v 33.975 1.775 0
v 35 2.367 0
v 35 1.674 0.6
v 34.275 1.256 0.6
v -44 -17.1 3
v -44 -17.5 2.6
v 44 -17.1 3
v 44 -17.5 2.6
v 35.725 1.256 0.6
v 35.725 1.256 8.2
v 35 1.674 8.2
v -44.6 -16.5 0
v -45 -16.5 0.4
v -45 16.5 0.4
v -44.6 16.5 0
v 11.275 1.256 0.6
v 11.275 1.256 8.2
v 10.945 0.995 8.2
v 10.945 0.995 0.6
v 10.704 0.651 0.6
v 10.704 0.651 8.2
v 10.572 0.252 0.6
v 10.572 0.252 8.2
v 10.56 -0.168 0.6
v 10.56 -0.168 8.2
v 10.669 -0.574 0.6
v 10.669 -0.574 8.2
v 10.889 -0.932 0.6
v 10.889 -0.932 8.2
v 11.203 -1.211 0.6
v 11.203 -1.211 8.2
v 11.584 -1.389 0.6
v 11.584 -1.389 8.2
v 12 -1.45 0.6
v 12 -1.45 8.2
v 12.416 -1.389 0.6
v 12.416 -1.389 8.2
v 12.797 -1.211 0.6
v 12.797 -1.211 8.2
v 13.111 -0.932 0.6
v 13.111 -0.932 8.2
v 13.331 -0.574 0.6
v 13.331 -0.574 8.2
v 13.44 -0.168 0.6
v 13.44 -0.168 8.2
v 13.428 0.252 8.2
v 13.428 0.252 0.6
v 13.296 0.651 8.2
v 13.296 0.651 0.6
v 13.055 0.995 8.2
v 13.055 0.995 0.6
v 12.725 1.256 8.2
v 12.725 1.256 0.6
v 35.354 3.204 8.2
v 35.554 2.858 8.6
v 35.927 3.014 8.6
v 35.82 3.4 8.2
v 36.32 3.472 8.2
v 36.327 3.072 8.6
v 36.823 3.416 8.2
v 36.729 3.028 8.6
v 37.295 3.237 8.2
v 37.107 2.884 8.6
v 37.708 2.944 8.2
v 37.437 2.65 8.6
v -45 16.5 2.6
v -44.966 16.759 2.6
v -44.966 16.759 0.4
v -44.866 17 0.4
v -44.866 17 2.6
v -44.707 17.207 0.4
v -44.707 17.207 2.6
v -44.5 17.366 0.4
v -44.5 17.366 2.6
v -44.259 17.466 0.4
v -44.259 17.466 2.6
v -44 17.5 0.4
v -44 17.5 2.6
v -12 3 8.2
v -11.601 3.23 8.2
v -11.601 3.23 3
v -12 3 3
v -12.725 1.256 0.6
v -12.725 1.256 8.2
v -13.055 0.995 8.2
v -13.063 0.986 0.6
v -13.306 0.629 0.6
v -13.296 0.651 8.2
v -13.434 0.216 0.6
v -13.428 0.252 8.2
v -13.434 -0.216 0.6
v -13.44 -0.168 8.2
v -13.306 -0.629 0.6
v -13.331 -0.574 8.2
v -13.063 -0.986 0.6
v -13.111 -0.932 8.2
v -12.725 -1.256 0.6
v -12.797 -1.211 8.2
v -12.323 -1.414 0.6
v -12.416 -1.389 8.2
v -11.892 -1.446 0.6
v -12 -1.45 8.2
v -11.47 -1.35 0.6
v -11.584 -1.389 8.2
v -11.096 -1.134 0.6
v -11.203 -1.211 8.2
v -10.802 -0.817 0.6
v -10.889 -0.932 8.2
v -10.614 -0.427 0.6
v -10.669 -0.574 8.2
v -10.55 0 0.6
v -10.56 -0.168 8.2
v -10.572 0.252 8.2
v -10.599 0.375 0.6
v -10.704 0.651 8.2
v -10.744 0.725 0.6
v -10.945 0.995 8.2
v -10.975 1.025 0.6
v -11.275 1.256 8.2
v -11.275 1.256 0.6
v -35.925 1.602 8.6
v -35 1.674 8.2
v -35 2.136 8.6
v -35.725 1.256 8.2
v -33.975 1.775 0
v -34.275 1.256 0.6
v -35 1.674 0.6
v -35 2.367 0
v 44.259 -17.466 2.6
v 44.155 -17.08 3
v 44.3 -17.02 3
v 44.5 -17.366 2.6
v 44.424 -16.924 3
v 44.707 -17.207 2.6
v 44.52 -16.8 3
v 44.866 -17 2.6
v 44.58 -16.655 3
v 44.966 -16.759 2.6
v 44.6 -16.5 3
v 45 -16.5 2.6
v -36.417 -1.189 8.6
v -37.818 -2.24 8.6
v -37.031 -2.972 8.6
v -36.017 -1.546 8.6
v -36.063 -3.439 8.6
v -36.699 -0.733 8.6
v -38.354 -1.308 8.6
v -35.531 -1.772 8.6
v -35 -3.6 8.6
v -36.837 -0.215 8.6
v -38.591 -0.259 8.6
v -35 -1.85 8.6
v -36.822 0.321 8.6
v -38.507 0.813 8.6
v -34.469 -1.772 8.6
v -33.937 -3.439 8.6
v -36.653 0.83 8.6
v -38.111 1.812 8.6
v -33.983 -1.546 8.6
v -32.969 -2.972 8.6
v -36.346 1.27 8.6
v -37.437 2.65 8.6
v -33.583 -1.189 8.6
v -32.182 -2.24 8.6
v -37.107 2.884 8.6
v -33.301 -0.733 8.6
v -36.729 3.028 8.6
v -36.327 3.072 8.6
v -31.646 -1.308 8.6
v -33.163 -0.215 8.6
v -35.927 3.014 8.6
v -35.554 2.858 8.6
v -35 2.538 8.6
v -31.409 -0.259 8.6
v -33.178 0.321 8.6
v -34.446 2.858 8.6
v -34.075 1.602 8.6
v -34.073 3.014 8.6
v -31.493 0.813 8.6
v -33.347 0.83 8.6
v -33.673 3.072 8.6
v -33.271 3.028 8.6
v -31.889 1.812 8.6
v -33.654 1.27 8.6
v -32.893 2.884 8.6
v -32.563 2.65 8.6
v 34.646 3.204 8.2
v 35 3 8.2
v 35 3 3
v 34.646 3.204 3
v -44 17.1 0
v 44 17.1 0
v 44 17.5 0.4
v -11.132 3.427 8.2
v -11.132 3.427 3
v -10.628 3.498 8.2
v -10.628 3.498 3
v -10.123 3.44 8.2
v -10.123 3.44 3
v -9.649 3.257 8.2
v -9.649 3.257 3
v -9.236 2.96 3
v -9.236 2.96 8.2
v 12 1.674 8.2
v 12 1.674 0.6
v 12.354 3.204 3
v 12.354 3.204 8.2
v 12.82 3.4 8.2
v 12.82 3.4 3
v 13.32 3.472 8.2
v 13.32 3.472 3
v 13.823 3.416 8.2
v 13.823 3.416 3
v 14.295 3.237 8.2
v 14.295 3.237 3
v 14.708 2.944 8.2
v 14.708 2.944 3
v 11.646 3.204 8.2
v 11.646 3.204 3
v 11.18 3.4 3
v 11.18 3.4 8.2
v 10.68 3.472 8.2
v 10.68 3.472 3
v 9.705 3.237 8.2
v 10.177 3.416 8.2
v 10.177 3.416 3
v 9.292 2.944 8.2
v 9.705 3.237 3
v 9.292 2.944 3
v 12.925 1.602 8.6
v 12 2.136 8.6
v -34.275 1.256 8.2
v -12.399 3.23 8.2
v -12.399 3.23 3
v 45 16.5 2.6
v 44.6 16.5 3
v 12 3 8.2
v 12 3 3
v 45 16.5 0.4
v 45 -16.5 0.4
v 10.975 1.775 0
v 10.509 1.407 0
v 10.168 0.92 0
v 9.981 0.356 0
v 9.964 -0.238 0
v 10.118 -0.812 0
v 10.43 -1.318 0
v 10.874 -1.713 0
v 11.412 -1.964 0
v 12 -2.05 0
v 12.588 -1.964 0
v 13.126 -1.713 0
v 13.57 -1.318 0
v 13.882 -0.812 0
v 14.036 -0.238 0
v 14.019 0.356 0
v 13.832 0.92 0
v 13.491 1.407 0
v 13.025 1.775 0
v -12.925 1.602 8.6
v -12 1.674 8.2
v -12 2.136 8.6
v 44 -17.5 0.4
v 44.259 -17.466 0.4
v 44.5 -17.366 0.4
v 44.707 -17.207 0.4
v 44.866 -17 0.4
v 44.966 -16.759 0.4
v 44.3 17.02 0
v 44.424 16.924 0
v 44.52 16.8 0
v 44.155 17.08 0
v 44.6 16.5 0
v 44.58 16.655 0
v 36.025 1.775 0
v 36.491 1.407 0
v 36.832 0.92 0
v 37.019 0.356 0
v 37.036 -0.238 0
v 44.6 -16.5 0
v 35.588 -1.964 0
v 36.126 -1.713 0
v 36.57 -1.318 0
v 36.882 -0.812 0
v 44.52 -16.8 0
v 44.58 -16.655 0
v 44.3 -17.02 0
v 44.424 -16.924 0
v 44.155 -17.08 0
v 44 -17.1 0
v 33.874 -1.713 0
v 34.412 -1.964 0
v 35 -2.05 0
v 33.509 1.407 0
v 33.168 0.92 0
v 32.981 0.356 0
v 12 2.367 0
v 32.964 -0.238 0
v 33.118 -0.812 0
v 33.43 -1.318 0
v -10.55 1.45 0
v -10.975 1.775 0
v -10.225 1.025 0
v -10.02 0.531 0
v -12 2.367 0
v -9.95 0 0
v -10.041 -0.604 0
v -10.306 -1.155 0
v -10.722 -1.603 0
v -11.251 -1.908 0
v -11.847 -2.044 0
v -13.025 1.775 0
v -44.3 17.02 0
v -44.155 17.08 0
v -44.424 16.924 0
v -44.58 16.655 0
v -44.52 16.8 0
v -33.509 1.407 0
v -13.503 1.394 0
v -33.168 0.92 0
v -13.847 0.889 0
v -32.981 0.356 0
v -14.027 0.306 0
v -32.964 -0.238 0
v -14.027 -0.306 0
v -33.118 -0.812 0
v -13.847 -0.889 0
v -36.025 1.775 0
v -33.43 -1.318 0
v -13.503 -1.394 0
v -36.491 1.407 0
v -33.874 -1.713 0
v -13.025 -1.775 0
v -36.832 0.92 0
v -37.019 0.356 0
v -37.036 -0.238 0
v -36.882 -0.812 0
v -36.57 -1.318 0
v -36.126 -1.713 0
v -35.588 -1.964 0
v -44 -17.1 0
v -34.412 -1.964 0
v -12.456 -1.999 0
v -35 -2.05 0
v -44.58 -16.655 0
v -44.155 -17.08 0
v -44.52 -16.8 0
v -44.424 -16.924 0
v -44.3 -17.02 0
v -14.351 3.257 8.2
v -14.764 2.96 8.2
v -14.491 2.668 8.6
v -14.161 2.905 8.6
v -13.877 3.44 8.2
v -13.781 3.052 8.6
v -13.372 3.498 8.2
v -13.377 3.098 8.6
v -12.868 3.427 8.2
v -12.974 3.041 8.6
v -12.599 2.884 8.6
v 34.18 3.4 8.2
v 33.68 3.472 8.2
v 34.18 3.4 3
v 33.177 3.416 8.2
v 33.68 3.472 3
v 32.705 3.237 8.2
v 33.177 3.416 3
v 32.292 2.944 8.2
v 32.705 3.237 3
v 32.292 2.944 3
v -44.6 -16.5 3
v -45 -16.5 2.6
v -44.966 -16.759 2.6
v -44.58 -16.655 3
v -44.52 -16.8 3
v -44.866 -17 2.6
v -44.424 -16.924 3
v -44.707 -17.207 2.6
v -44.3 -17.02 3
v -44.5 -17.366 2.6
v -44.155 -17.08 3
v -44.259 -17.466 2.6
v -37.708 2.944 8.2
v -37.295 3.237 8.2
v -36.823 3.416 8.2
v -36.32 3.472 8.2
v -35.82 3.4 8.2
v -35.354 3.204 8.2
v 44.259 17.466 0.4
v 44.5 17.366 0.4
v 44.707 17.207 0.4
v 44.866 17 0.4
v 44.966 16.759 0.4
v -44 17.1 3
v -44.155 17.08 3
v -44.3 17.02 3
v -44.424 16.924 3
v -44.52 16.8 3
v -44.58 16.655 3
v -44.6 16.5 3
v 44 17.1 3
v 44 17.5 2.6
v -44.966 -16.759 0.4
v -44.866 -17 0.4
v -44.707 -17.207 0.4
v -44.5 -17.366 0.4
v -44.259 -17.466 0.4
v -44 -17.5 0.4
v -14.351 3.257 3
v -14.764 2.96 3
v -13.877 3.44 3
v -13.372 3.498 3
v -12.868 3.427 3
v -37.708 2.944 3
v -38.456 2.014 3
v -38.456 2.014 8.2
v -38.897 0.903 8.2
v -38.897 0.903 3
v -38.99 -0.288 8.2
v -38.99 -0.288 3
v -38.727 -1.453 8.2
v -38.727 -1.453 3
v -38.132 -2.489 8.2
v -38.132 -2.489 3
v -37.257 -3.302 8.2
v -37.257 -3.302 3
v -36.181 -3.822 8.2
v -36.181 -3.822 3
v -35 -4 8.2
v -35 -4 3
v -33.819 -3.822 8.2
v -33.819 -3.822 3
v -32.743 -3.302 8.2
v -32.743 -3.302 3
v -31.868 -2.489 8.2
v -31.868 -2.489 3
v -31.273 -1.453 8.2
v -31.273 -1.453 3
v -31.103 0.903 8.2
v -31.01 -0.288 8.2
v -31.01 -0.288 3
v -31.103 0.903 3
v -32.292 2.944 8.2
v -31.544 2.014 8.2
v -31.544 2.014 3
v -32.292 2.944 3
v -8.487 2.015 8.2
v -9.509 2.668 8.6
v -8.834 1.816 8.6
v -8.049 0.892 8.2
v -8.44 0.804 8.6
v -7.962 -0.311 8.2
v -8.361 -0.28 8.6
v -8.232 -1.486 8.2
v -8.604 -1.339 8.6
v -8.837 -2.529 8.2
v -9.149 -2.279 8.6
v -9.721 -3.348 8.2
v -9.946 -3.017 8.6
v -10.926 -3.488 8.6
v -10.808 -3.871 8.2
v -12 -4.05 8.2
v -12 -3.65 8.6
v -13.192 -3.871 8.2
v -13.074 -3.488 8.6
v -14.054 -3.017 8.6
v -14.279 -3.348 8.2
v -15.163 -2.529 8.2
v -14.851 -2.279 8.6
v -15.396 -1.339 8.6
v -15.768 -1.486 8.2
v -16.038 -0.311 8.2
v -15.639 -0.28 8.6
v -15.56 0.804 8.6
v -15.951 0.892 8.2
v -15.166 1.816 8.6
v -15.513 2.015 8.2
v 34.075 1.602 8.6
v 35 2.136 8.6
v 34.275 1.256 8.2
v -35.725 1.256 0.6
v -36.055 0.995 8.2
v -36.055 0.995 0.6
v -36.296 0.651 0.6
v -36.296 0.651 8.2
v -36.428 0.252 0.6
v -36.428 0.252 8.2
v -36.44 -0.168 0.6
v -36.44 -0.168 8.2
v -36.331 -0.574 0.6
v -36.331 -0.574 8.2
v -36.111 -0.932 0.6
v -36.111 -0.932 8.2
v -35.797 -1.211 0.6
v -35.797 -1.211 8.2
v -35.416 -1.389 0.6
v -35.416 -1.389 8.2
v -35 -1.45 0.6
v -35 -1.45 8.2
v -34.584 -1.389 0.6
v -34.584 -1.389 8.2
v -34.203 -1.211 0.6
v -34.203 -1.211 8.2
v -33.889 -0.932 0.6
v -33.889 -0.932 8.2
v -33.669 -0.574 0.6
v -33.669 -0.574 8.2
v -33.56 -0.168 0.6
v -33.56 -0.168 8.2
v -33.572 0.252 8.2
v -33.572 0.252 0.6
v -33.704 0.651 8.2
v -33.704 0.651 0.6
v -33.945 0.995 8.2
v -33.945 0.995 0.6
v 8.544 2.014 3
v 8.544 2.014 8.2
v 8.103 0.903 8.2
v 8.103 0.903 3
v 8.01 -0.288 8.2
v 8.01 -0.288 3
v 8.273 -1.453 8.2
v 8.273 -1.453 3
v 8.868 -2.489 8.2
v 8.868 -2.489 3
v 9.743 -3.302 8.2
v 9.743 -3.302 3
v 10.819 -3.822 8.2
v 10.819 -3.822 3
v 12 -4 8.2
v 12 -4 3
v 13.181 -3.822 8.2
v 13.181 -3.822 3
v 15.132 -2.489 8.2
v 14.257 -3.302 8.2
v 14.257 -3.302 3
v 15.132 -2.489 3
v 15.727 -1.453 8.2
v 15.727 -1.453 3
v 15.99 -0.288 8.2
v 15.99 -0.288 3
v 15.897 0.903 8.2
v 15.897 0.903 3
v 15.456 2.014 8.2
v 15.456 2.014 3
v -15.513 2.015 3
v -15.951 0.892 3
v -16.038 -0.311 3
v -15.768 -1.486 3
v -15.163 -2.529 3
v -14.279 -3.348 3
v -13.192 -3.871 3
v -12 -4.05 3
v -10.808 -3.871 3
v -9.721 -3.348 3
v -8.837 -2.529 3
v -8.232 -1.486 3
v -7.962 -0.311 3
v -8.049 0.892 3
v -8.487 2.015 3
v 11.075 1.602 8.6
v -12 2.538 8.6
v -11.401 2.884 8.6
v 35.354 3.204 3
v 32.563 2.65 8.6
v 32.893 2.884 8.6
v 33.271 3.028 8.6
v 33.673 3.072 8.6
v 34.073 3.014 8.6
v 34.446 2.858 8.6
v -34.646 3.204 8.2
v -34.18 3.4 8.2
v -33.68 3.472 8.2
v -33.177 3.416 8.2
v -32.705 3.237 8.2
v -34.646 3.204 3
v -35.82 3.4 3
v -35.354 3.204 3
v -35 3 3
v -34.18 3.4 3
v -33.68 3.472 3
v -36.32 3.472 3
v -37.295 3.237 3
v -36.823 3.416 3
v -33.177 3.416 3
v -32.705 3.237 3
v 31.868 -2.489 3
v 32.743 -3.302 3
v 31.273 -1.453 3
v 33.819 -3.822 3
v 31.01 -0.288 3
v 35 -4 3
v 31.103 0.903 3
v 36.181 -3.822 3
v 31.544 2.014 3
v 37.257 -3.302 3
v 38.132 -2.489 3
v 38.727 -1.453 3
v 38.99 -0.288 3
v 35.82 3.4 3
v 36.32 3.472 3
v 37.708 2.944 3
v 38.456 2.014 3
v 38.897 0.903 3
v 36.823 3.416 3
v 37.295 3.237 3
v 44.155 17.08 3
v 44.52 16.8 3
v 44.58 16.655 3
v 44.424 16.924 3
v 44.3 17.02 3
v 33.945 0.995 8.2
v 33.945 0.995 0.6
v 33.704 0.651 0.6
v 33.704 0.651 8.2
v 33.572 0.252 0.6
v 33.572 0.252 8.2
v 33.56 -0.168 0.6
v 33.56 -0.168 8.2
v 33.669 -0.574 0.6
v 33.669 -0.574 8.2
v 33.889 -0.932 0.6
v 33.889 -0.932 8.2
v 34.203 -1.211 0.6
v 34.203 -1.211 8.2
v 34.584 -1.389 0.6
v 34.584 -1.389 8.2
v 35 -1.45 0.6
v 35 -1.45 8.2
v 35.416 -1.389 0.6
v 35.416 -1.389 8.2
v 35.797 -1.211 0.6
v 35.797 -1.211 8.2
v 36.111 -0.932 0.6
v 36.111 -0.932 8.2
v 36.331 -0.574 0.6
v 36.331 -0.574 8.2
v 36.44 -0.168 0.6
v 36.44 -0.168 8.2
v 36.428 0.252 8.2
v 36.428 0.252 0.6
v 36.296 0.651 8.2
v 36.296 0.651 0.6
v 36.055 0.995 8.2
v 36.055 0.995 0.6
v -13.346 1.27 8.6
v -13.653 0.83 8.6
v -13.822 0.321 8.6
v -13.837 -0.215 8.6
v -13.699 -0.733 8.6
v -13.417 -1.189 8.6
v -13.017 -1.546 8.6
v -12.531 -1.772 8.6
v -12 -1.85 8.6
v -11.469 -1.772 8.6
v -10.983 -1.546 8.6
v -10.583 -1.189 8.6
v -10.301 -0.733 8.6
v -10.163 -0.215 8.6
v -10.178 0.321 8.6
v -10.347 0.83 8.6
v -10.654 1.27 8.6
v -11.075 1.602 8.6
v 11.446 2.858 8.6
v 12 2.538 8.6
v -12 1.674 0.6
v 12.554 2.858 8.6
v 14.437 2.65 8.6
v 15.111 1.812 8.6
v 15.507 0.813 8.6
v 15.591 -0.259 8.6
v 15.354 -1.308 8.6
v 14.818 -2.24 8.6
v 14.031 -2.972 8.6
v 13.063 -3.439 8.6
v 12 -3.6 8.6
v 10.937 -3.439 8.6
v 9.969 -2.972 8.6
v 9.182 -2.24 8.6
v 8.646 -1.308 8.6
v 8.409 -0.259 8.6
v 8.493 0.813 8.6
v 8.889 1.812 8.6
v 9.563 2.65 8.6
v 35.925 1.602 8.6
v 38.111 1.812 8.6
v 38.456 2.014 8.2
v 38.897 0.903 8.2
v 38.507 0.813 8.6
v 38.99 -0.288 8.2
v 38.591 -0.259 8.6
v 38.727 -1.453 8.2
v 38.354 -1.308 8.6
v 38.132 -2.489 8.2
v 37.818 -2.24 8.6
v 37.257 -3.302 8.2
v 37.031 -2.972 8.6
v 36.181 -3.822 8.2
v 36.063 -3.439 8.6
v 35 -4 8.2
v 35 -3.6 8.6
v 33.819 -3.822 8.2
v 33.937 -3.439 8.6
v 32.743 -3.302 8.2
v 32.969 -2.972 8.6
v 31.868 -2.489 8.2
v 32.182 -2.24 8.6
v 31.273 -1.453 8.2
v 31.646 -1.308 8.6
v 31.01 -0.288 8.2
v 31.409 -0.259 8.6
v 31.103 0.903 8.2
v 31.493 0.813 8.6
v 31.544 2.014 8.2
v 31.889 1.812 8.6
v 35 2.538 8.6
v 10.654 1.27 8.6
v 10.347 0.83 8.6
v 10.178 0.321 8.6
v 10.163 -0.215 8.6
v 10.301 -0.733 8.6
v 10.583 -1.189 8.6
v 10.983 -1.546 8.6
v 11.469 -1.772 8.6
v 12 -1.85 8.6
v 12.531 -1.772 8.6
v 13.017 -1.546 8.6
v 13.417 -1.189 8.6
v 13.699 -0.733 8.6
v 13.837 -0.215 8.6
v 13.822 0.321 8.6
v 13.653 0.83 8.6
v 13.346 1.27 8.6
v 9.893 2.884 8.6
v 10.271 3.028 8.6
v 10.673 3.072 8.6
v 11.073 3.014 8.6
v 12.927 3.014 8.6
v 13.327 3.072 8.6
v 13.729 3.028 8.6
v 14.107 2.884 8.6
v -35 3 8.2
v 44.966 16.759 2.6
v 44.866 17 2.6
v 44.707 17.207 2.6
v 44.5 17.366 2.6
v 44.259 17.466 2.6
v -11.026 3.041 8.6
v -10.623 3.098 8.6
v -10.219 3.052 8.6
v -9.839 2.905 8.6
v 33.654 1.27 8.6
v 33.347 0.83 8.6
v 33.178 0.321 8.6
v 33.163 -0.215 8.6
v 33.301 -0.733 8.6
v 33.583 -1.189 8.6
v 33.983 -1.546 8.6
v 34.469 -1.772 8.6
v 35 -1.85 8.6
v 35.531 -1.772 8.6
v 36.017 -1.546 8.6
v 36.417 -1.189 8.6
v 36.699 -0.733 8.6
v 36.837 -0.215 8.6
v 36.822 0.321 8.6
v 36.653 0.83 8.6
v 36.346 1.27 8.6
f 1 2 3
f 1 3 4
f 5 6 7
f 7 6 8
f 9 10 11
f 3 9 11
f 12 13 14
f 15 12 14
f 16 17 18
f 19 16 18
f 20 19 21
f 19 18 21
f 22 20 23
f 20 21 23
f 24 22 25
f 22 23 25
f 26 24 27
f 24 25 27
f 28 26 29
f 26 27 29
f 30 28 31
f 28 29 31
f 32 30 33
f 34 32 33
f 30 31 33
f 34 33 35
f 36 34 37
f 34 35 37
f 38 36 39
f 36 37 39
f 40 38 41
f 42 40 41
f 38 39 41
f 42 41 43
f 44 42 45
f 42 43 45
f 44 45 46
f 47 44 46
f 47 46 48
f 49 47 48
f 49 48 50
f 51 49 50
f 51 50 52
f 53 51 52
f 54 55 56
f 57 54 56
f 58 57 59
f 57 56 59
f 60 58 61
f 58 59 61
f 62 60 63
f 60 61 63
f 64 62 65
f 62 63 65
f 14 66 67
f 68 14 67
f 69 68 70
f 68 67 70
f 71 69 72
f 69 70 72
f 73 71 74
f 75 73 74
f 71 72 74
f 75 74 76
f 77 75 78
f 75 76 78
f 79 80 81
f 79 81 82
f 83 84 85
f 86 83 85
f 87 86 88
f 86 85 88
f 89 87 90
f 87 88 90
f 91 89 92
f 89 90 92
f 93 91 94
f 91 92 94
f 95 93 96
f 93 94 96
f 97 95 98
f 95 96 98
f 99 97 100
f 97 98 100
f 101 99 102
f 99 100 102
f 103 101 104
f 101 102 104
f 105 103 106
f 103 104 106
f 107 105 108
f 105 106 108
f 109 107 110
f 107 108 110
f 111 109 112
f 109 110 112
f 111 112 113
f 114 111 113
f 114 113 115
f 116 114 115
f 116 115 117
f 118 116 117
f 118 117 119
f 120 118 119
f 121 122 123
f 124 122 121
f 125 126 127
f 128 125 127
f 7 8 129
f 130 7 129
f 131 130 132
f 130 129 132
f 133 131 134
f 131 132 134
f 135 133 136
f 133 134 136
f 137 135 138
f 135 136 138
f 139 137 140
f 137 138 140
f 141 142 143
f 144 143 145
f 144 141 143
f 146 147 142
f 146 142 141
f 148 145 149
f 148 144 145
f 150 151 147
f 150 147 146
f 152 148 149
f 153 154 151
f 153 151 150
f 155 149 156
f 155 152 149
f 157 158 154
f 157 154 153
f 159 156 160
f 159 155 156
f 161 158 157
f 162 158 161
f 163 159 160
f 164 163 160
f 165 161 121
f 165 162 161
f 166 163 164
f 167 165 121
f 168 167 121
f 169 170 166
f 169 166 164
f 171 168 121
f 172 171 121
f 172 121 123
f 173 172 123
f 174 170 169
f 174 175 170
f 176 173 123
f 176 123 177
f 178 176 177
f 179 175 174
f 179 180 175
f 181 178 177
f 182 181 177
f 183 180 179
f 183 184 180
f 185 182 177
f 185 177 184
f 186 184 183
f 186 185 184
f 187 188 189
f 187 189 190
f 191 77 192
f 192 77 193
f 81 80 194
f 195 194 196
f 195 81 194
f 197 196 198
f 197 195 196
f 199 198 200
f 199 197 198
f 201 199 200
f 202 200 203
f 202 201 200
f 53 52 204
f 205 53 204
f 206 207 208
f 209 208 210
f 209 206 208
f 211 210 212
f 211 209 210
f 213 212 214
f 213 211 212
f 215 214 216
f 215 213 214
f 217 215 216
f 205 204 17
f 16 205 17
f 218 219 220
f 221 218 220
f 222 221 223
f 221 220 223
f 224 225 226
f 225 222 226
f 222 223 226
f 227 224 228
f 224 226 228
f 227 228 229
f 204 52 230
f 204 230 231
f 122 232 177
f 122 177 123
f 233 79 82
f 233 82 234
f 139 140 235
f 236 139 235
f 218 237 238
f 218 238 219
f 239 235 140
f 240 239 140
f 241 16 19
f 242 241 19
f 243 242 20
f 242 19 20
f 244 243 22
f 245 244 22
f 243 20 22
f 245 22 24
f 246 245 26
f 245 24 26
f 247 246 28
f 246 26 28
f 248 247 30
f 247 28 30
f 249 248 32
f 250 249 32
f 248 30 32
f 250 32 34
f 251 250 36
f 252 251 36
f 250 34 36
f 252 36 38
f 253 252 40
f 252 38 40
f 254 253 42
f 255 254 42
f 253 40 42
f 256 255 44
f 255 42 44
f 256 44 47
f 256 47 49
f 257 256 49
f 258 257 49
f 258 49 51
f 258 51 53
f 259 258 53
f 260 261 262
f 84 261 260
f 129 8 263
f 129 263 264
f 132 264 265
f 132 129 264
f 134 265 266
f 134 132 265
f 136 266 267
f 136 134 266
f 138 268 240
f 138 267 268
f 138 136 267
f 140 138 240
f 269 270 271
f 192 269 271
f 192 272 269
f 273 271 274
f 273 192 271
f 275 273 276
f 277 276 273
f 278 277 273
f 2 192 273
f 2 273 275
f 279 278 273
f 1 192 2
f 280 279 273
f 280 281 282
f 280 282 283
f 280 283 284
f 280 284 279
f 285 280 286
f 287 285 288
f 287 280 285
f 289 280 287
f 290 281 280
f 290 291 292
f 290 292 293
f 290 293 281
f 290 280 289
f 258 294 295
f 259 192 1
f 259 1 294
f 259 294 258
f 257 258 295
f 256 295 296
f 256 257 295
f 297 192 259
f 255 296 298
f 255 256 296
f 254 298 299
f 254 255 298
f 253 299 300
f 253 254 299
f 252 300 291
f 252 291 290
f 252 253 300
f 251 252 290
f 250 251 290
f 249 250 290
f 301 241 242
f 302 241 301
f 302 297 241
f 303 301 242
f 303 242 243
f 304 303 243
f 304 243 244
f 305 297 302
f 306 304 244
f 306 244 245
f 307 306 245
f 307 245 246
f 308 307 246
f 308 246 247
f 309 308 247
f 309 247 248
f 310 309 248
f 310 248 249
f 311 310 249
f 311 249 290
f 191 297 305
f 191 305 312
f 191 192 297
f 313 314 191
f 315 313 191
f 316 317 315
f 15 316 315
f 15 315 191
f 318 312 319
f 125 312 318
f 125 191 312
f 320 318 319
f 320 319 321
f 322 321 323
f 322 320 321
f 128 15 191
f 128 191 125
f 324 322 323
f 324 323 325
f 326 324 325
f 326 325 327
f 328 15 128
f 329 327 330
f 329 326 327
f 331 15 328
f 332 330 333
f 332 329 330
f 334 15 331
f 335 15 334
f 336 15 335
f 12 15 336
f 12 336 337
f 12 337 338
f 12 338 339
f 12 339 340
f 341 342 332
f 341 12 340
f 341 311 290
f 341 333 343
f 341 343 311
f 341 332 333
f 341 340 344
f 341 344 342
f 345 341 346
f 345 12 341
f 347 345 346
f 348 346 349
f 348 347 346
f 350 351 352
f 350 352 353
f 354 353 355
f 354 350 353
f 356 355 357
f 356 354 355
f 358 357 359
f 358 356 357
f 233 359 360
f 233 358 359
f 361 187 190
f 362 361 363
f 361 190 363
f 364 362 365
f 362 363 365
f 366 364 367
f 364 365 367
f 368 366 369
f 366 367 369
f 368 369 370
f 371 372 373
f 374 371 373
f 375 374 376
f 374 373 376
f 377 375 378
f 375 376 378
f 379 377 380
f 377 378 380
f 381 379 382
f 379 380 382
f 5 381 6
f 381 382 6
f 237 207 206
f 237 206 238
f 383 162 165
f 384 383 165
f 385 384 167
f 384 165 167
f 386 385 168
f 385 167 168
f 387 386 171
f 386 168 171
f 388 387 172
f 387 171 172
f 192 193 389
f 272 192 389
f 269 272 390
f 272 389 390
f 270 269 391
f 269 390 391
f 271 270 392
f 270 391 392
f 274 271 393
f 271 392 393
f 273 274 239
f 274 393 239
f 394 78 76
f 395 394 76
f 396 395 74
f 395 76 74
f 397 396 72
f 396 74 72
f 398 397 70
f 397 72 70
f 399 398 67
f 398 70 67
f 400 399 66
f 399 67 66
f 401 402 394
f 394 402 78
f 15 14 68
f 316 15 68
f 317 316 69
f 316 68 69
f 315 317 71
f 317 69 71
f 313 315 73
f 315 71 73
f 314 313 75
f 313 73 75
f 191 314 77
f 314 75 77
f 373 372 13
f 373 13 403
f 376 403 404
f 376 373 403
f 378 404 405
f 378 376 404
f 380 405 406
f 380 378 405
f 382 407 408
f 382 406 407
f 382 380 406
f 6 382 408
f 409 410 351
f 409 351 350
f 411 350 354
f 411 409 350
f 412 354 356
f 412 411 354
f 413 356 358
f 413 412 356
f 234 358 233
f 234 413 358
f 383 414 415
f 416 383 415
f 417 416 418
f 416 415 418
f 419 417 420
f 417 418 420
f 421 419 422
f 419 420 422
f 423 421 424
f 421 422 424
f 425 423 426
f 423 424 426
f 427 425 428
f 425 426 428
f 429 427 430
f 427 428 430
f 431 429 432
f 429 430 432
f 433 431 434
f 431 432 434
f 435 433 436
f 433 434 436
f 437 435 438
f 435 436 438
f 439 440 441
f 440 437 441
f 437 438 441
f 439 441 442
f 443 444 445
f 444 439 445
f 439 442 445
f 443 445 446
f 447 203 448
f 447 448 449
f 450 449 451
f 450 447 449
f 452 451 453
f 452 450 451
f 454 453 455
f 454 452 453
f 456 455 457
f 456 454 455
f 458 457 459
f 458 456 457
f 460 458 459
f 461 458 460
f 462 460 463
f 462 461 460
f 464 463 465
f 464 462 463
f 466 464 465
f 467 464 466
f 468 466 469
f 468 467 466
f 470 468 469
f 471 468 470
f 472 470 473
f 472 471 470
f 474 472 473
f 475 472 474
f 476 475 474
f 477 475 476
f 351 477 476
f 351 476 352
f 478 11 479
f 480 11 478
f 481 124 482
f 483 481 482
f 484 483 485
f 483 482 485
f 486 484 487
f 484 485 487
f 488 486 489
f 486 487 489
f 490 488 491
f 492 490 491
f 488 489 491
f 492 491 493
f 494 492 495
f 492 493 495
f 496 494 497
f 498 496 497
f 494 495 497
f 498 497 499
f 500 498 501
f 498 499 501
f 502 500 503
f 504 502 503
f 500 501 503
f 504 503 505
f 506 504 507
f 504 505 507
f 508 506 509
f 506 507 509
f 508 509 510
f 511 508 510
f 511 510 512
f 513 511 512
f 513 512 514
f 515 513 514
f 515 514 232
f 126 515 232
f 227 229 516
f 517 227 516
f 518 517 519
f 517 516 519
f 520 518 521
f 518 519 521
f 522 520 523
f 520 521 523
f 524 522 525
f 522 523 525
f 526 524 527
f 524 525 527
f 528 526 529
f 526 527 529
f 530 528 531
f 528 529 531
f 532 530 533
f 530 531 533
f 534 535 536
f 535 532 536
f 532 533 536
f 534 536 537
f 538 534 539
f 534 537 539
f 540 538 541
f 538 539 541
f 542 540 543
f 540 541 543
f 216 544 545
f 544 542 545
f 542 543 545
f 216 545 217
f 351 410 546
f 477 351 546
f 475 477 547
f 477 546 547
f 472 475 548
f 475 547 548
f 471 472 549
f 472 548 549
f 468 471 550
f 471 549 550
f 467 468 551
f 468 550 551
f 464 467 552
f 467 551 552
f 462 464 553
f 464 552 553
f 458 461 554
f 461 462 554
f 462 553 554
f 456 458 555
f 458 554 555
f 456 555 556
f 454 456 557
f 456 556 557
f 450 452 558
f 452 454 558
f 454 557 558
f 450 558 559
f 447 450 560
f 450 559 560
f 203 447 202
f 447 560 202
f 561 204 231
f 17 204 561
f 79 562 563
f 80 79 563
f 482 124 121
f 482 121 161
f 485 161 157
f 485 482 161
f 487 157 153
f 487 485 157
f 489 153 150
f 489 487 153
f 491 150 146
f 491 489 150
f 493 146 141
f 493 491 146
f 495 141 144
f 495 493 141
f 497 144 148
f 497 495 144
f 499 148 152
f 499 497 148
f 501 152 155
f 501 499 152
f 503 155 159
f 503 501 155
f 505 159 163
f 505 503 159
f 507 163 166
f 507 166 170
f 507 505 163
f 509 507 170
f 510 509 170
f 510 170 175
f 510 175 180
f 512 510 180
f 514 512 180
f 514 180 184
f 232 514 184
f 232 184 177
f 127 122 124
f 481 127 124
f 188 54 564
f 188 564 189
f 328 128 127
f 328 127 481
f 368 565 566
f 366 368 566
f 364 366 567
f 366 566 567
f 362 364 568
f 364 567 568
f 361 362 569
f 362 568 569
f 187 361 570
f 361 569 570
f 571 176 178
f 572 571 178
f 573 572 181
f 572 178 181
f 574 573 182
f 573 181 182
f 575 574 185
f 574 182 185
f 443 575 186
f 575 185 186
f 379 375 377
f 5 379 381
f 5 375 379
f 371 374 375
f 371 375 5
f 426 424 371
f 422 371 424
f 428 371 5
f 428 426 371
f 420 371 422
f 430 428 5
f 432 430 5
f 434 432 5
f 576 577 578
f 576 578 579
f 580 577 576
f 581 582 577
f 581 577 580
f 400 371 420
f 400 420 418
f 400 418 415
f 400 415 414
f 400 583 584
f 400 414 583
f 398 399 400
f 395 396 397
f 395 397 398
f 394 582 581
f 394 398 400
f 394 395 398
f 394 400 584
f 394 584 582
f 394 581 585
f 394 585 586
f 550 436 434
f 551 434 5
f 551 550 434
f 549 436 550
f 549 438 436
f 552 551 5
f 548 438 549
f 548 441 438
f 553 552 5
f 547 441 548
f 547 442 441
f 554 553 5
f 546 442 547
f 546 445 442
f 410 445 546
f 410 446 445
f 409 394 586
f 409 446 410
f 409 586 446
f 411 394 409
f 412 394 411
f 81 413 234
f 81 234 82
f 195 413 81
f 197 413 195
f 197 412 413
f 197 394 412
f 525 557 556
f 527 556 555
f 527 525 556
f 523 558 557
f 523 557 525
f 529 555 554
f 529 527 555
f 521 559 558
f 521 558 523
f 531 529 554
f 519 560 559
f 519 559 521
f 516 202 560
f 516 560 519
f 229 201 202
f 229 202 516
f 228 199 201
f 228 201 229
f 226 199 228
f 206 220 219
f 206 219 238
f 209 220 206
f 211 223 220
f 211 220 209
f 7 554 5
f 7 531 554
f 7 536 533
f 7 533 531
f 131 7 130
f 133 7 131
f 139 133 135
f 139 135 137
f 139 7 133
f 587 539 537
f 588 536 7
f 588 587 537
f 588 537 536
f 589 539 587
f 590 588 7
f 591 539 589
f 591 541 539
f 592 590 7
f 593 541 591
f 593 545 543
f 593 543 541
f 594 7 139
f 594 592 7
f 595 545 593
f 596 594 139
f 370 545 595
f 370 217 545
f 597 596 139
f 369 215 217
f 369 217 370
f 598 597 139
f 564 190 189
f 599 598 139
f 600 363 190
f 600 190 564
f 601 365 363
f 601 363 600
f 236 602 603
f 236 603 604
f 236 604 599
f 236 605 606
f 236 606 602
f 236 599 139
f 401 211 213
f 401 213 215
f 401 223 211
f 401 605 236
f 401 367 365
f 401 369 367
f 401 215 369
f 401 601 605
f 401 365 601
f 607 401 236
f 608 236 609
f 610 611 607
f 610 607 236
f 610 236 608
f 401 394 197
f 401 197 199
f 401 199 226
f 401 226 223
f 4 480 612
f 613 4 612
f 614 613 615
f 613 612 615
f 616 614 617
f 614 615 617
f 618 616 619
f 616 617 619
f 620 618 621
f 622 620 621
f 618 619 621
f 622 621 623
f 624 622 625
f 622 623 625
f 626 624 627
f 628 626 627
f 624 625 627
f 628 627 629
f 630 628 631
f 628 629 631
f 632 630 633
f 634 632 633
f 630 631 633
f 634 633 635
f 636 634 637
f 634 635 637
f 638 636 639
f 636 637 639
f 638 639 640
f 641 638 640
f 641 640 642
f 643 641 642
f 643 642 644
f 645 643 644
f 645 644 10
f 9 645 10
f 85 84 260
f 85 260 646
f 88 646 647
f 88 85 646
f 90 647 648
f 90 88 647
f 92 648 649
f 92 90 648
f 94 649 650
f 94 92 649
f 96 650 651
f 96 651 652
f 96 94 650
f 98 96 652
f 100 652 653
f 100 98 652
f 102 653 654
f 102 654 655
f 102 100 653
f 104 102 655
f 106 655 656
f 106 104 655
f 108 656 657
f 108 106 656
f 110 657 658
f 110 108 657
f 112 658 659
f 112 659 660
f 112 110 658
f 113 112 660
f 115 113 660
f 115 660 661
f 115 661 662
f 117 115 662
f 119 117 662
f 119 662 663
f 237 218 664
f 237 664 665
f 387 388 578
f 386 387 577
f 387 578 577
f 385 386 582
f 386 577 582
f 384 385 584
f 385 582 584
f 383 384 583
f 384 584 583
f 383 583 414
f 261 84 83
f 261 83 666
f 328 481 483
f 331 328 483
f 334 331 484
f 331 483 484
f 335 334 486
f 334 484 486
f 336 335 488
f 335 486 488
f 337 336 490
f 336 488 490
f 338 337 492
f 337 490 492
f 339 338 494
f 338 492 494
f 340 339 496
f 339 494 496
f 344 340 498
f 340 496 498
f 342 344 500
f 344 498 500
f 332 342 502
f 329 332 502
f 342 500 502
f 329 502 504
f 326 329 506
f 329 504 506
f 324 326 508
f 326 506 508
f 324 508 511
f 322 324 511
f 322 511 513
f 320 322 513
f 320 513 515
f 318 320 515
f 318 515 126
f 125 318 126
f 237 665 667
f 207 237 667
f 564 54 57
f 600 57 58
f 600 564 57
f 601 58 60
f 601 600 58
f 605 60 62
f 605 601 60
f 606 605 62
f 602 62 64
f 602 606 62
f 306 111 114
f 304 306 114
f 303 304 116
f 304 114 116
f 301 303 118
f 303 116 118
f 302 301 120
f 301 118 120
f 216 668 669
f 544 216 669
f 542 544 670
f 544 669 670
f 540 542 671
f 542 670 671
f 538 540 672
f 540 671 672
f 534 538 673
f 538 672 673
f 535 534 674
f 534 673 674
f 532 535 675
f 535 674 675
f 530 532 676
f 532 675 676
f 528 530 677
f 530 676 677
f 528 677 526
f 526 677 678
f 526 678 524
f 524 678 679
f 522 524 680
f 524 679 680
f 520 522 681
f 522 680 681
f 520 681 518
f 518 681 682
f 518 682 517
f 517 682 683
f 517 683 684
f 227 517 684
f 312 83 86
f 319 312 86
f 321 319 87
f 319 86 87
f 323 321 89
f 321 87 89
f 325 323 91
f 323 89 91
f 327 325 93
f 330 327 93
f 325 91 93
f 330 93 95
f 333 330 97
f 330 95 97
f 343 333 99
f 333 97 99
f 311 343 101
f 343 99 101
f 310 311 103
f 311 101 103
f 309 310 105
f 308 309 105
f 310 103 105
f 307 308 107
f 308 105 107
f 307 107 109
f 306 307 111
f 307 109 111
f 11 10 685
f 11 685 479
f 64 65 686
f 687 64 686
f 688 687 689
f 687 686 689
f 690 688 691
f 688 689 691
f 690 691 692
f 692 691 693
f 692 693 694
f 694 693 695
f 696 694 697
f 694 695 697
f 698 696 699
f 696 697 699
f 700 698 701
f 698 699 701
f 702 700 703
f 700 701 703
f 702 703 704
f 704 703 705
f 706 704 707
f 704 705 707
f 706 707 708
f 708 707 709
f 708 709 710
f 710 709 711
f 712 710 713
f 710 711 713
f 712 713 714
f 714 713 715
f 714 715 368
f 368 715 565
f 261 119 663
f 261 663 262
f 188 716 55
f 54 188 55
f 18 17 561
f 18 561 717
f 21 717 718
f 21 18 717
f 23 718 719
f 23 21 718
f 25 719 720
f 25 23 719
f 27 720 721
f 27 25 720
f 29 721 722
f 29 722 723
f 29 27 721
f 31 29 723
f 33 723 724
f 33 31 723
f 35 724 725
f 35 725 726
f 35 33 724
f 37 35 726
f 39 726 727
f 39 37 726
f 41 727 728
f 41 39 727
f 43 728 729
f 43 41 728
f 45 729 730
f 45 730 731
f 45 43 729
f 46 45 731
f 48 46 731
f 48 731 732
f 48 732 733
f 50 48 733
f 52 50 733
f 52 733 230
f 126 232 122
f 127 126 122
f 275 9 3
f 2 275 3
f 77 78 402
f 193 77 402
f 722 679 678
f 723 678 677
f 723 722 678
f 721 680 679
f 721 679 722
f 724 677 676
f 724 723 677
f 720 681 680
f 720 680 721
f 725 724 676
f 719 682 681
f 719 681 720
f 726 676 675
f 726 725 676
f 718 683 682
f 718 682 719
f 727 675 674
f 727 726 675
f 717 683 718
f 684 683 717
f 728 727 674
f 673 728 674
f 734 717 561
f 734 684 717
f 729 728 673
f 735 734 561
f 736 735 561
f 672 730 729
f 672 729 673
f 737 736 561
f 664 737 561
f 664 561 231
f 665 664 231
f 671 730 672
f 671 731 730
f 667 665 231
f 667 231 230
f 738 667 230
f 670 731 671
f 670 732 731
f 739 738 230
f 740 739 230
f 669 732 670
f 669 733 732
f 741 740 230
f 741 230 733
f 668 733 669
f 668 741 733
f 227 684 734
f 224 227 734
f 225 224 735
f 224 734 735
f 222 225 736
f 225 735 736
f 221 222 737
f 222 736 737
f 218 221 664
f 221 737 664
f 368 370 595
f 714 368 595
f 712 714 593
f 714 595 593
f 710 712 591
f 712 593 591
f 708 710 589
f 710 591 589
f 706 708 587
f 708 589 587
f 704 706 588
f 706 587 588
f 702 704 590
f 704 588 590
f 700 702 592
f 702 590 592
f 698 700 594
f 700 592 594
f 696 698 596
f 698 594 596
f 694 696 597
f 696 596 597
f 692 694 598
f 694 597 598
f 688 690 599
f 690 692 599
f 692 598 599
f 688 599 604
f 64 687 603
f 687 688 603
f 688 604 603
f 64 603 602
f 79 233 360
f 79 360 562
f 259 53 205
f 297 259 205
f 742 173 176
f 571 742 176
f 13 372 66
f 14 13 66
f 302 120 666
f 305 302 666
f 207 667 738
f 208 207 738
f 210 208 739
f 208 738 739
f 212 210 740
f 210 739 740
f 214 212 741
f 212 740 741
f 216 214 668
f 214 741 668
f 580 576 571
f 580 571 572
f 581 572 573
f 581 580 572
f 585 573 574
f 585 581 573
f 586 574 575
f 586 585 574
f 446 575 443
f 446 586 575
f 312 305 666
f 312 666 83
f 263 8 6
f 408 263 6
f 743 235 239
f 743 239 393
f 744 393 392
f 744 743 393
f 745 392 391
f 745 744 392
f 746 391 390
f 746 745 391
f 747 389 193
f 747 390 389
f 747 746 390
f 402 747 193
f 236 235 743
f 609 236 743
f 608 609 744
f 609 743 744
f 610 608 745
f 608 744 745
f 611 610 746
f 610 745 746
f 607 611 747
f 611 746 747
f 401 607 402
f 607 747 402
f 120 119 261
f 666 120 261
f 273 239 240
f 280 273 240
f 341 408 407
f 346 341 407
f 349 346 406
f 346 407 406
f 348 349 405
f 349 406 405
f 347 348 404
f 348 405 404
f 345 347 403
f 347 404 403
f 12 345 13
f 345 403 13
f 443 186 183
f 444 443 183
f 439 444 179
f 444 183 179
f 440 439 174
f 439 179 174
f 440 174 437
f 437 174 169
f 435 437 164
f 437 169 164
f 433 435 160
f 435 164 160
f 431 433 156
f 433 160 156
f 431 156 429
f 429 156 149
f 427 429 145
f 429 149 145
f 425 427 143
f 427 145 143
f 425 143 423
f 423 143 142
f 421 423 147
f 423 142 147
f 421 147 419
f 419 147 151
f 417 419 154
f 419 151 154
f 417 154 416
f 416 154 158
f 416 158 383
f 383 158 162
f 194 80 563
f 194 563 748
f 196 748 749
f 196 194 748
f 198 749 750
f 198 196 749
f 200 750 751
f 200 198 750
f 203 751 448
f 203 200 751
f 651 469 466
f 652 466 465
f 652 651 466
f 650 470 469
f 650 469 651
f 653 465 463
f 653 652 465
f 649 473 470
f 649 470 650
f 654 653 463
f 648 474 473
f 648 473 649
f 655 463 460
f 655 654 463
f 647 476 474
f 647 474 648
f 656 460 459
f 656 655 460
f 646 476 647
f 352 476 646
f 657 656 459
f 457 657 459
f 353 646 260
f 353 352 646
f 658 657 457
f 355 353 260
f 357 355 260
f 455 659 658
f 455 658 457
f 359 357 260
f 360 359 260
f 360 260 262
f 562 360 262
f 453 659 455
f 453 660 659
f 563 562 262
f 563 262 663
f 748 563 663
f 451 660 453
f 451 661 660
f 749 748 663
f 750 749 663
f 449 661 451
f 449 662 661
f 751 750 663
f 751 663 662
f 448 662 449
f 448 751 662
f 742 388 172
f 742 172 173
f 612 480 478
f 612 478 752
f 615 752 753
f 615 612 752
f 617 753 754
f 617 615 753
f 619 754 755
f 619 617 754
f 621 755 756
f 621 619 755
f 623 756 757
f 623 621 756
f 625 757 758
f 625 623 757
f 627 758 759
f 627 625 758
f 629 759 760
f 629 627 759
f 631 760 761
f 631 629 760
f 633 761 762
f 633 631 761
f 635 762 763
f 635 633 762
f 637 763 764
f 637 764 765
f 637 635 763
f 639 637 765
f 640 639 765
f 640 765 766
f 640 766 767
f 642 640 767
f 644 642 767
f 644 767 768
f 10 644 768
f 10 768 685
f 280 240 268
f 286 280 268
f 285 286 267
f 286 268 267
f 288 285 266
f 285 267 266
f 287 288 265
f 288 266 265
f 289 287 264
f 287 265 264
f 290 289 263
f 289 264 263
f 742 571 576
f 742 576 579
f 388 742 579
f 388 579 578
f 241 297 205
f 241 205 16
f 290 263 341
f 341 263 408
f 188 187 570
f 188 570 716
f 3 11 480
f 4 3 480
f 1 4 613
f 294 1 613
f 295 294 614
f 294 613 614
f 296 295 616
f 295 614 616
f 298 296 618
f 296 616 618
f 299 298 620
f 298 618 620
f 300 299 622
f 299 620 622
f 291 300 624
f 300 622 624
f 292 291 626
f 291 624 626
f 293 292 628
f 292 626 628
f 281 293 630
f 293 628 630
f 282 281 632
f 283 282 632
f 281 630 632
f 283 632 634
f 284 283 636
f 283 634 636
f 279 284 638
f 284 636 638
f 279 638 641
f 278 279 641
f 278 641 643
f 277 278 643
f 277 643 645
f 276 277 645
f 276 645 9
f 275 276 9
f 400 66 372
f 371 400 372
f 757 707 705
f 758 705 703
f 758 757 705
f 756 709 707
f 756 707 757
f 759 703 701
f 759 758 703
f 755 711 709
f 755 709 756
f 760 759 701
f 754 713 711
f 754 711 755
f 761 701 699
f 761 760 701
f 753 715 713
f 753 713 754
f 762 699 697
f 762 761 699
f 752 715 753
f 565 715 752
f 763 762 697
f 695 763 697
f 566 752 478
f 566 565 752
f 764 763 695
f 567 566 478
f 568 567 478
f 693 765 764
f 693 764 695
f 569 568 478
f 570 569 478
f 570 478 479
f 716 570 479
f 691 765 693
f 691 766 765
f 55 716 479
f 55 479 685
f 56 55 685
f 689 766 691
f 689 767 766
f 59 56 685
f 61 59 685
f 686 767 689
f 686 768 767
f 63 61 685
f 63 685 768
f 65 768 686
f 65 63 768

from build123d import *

# Parameters (mm, degrees)
SKETCH_W                = 90
SKETCH_H                = 35
PAD_DEPTH               = 3
SKETCH001_R             = 10.5
HOLE_DEPTH              = 25
HOLE_TEARDROPS_DEPTH    = 25
SKETCH002_R             = 4
PAD001_DEPTH            = 5.6
POCKET_DEPTH            = 5.6
SKETCH004_R             = 1.45
HOLE001_DEPTH           = 25
HOLE001_TEARDROPS_DEPTH = 25
FILLET_R                = 2
CHAMFER_SIZE            = 0.4
FILLET001_R             = 1
PAD002_DEPTH            = 7
SKETCH005_R             = 14.71653
PAD003_DEPTH            = 10
SKETCH006_R             = 4.05
PAD004_DEPTH            = 5.6
POCKET001_DEPTH         = 5.6
SKETCH008_R             = 1.45
HOLE002_DEPTH           = 25
HOLE002_TEARDROPS_DEPTH = 25
FILLET002_R             = 2
CHAMFER001_SIZE         = 0.4
POCKET002_DEPTH         = 7
CHAMFER002_SIZE         = 0.4
CHAMFER003_SIZE         = 0.6


with BuildPart() as part:
    # Sketch → Pad (new body)
    with BuildSketch(Plane.XY):
        Rectangle(SKETCH_W, SKETCH_H)
    extrude(amount=PAD_DEPTH)

    # Sketch001 (on Face6 of Pad) → Hole (cut)
    with BuildSketch(Plane.XY.offset(3)):
        with Locations((-12, 0)):
            Circle(SKETCH001_R)
    extrude(amount=-HOLE_DEPTH, mode=Mode.SUBTRACT)

    # Sketch001_Teardrops (on Sketch) → Hole_Teardrops (cut)
    with BuildSketch(Plane.XY.offset(3)):
        with BuildLine():
            ThreePointArc((-17.25, 9.093267), (-12, -10.5), (-6.75, 9.093267))
            Line((-6.75, 9.093267), (-12, 12.124356))
            Line((-17.25, 9.093267), (-12, 12.124356))
        make_face()
    extrude(amount=-HOLE_TEARDROPS_DEPTH, mode=Mode.SUBTRACT)

    # Sketch002 (on Face5 of Hole_Teardrops) → Pad001 (join)
    with BuildSketch(Plane.XY.offset(3)):
        with Locations((35, 0)):
            Circle(SKETCH002_R)
        with Locations((12, 0)):
            Circle(SKETCH002_R)
        with Locations((-35, 0)):
            Circle(SKETCH002_R)
    extrude(amount=PAD001_DEPTH)

    # Sketch003 (on Face13 of Pad001) → Pocket (cut)
    with BuildSketch(Plane.XY.offset(8.6)):
        Polygon((-35, 3), (-38.464102, 5), (-31.535898, 5), align=None)
        Polygon((12, 3), (8.535898, 5), (15.464102, 5), align=None)
        Polygon((38.464102, 5), (35, 3), (31.535898, 5), align=None)
    extrude(amount=-POCKET_DEPTH, mode=Mode.SUBTRACT)

    # Sketch004 (on Face17 of Pocket) → Hole001 (cut)
    with BuildSketch(Plane.XY.offset(8.6)):
        with Locations((-35, 0)):
            Circle(SKETCH004_R)
        with Locations((12, 0)):
            Circle(SKETCH004_R)
        with Locations((35, 0)):
            Circle(SKETCH004_R)
    extrude(amount=-HOLE001_DEPTH, mode=Mode.SUBTRACT)

    # Sketch004_Teardrops (on Sketch) → Hole001_Teardrops (cut)
    with BuildSketch(Plane.XY.offset(8.6)):
        with BuildLine():
            ThreePointArc((-35.725, 1.255737), (-35, -1.45), (-34.275, 1.255737))
            Line((-34.275, 1.255737), (-35, 1.674316))
            Line((-35.725, 1.255737), (-35, 1.674316))
        make_face()
        with BuildLine():
            ThreePointArc((11.275, 1.255737), (12, -1.45), (12.725, 1.255737))
            Line((12.725, 1.255737), (12, 1.674316))
            Line((11.275, 1.255737), (12, 1.674316))
        make_face()
        with BuildLine():
            ThreePointArc((34.275, 1.255737), (35, -1.45), (35.725, 1.255737))
            Line((35.725, 1.255737), (35, 1.674316))
            Line((34.275, 1.255737), (35, 1.674316))
        make_face()
    extrude(amount=-HOLE001_TEARDROPS_DEPTH, mode=Mode.SUBTRACT)

    # Fillet
    fillet_edges = [part.edges().sort_by_distance(p)[0] for p in [
        (36.334875, 3.770691, 5.8),
        (33.665125, 3.770691, 5.8),
        (13.334875, 3.770691, 5.8),
        (10.665125, 3.770691, 5.8),
        (-33.665125, 3.770691, 5.8),
        (-36.334875, 3.770691, 5.8),
    ]]
    fillet(fillet_edges, radius=FILLET_R)

    # Chamfer
    chamfer_edges = [part.edges().sort_by_distance(p)[0] for p in [
        (33.392214, -3.662653, 8.6),
        (10.392214, -3.662653, 8.6),
        (-36.607786, -3.662653, 8.6),
        (-35.725, -1.255737, 8.6),
        (11.275, -1.255737, 8.6),
        (34.275, -1.255737, 8.6),
    ]]
    chamfer(chamfer_edges, length=CHAMFER_SIZE)

    # Fillet001
    fillet001_edges = [part.edges().sort_by_distance(p)[0] for p in [
        (45, 17.5, 1.5),
        (-45, 17.5, 1.5),
        (-45, -17.5, 1.5),
        (45, -17.5, 1.5),
    ]]
    fillet(fillet001_edges, radius=FILLET001_R)

    # Fillet001 Face28 → Pad002 (add)
    with BuildSketch(Plane(origin=(1.493435, -0.023344, 0), x_dir=(0, -1, 0), z_dir=(0, 0, -1))):
        with BuildLine():
            Line((16.476656, 46.493435), (-16.523344, 46.493435))
            ThreePointArc((-16.523344, 46.493435), (-17.230451, 46.200542), (-17.523344, 45.493435))
            Line((-17.523344, 45.493435), (-17.523344, -42.506565))
            ThreePointArc((-17.523344, -42.506565), (-17.230451, -43.213672), (-16.523344, -43.506565))
            Line((-16.523344, -43.506565), (16.476656, -43.506565))
            ThreePointArc((16.476656, -43.506565), (17.183762, -43.213672), (17.476656, -42.506565))
            Line((17.476656, -42.506565), (17.476656, 45.493435))
            ThreePointArc((17.476656, 45.493435), (17.183762, 46.200542), (16.476656, 46.493435))
        make_face()
        with BuildLine():
            ThreePointArc((-0.023344, 35.043435), (-0.748344, 35.237698), (-1.279081, 35.768435))
            Line((-1.279081, 35.768435), (-1.69766, 36.493435))
            Line((-1.69766, 36.493435), (-1.279081, 37.218435))
            ThreePointArc((-1.279081, 37.218435), (1.232392, 37.218435), (-0.023344, 35.043435))
        make_face(mode=Mode.SUBTRACT)
        with BuildLine():
            ThreePointArc((-0.023344, -11.956565), (-0.748344, -11.762302), (-1.279081, -11.231565))
            Line((-1.279081, -11.231565), (-1.69766, -10.506565))
            Line((-1.69766, -10.506565), (-1.279081, -9.781565))
            ThreePointArc((-1.279081, -9.781565), (1.232392, -9.781565), (-0.023344, -11.956565))
        make_face(mode=Mode.SUBTRACT)
        with BuildLine():
            ThreePointArc((-0.023344, -34.956565), (-0.748344, -34.762302), (-1.279081, -34.231565))
            Line((-1.279081, -34.231565), (-1.69766, -33.506565))
            Line((-1.69766, -33.506565), (-1.279081, -32.781565))
            ThreePointArc((-1.279081, -32.781565), (1.232392, -32.781565), (-0.023344, -34.956565))
        make_face(mode=Mode.SUBTRACT)
        with BuildLine():
            ThreePointArc((-0.023344, 2.993435), (-5.273344, 4.400168), (-9.116611, 8.243435))
            Line((-9.116611, 8.243435), (-12.1477, 13.493435))
            Line((-12.1477, 13.493435), (-9.116611, 18.743435))
            ThreePointArc((-9.116611, 18.743435), (9.069922, 18.743435), (-0.023344, 2.993435))
        make_face(mode=Mode.SUBTRACT)
    extrude(amount=PAD002_DEPTH)

    # Sketch005 (on Face3 of Pad002) → Pad003 (join)
    with BuildSketch(Plane.XY.offset(3)):
        with Locations((-11.639154, 0)):
            Circle(SKETCH005_R)
    extrude(amount=-PAD003_DEPTH)

    # Sketch006 (on Face67 of Pad003) → Pad004 (join)
    with BuildSketch(Plane.XY.offset(3)):
        with Locations((-12, 0)):
            Circle(SKETCH006_R)
    extrude(amount=PAD004_DEPTH)

    # Sketch007 (on Face66 of Pad004) → Pocket001 (cut)
    with BuildSketch(Plane.XY.offset(8.6)):
        Polygon((-12, 3), (-15.464102, 5), (-8.535898, 5), align=None)
    extrude(amount=-POCKET001_DEPTH, mode=Mode.SUBTRACT)

    # Sketch008 (on Face69 of Pocket001) → Hole002 (cut)
    with BuildSketch(Plane.XY.offset(8.6)):
        with Locations((-12, 0)):
            Circle(SKETCH008_R)
    extrude(amount=-HOLE002_DEPTH, mode=Mode.SUBTRACT)

    # Sketch008_Teardrops (on Sketch) → Hole002_Teardrops (cut)
    with BuildSketch(Plane.XY.offset(8.6)):
        with BuildLine():
            ThreePointArc((-12.725, 1.255737), (-12, -1.45), (-11.275, 1.255737))
            Line((-11.275, 1.255737), (-12, 1.674316))
            Line((-12.725, 1.255737), (-12, 1.674316))
        make_face()
    extrude(amount=-HOLE002_TEARDROPS_DEPTH, mode=Mode.SUBTRACT)

    # Fillet002
    fillet002_edges = [part.edges().sort_by_distance(p)[0] for p in [
        (-10.608429, 3.803424, 5.8),
        (-13.391571, 3.803424, 5.8),
    ]]
    fillet(fillet002_edges, radius=FILLET002_R)

    # Chamfer001
    chamfer001_edges = [part.edges().sort_by_distance(p)[0] for p in [
        (-12.725, -1.255737, 8.6),
        (-13.613716, -3.714623, 8.6),
    ]]
    chamfer(chamfer001_edges, length=CHAMFER001_SIZE)

    # Chamfer001 Face41 → Pocket002 (cut)
    with BuildSketch(Plane(origin=(0, -0.000217, -7), x_dir=(0, -1, 0), z_dir=(0, 0, -1))):
        with BuildLine():
            Line((16.499783, 45), (-16.500217, 45))
            ThreePointArc((-16.500217, 45), (-17.207324, 44.707107), (-17.500217, 44))
            Line((-17.500217, 44), (-17.500217, -44))
            ThreePointArc((-17.500217, -44), (-17.207324, -44.707107), (-16.500217, -45))
            Line((-16.500217, -45), (16.499783, -45))
            ThreePointArc((16.499783, -45), (17.20689, -44.707107), (17.499783, -44))
            Line((17.499783, -44), (17.499783, 44))
            ThreePointArc((17.499783, 44), (17.20689, 44.707107), (16.499783, 45))
        make_face()
        with BuildLine():
            ThreePointArc((-0.000217, -36.45), (-0.725217, -36.255737), (-1.255954, -35.725))
            Line((-1.255954, -35.725), (-1.674533, -35))
            Line((-1.674533, -35), (-1.255954, -34.275))
            ThreePointArc((-1.255954, -34.275), (1.25552, -34.275), (-0.000217, -36.45))
        make_face(mode=Mode.SUBTRACT)
        with BuildLine():
            ThreePointArc((-0.000217, -13.45), (-0.725217, -13.255737), (-1.255954, -12.725))
            Line((-1.255954, -12.725), (-1.674533, -12))
            Line((-1.674533, -12), (-1.255954, -11.275))
            ThreePointArc((-1.255954, -11.275), (1.25552, -11.275), (-0.000217, -13.45))
        make_face(mode=Mode.SUBTRACT)
        with BuildLine():
            ThreePointArc((-0.000217, 33.55), (-0.725217, 33.744263), (-1.255954, 34.275))
            Line((-1.255954, 34.275), (-1.674533, 35))
            Line((-1.674533, 35), (-1.255954, 35.725))
            ThreePointArc((-1.255954, 35.725), (1.25552, 35.725), (-0.000217, 33.55))
        make_face(mode=Mode.SUBTRACT)
        with BuildLine():
            ThreePointArc((-1.255954, 12.725), (1.25552, 12.725), (-0.000217, 10.55))
            ThreePointArc((-0.000217, 10.55), (-0.725217, 10.744263), (-1.255954, 11.275))
            Line((-1.255954, 11.275), (-1.674533, 12))
            Line((-1.674533, 12), (-1.255954, 12.725))
        make_face(mode=Mode.SUBTRACT)
    extrude(amount=-POCKET002_DEPTH, mode=Mode.SUBTRACT)

    # Chamfer002
    chamfer002_edges = [part.edges().sort_by_distance(p)[0] for p in [
        (0, -17.5, 3),
        (0, -17.5, 0),
    ]]
    chamfer(chamfer002_edges, length=CHAMFER002_SIZE)

    # Chamfer003
    chamfer003_edges = [part.edges().sort_by_distance(p)[0] for p in [
        (34.275, -1.255737, 0),
        (11.275, -1.255737, 0),
        (-12.725, -1.255737, 0),
        (-35.725, -1.255737, 0),
    ]]
    chamfer(chamfer003_edges, length=CHAMFER003_SIZE)


solid = part.part
